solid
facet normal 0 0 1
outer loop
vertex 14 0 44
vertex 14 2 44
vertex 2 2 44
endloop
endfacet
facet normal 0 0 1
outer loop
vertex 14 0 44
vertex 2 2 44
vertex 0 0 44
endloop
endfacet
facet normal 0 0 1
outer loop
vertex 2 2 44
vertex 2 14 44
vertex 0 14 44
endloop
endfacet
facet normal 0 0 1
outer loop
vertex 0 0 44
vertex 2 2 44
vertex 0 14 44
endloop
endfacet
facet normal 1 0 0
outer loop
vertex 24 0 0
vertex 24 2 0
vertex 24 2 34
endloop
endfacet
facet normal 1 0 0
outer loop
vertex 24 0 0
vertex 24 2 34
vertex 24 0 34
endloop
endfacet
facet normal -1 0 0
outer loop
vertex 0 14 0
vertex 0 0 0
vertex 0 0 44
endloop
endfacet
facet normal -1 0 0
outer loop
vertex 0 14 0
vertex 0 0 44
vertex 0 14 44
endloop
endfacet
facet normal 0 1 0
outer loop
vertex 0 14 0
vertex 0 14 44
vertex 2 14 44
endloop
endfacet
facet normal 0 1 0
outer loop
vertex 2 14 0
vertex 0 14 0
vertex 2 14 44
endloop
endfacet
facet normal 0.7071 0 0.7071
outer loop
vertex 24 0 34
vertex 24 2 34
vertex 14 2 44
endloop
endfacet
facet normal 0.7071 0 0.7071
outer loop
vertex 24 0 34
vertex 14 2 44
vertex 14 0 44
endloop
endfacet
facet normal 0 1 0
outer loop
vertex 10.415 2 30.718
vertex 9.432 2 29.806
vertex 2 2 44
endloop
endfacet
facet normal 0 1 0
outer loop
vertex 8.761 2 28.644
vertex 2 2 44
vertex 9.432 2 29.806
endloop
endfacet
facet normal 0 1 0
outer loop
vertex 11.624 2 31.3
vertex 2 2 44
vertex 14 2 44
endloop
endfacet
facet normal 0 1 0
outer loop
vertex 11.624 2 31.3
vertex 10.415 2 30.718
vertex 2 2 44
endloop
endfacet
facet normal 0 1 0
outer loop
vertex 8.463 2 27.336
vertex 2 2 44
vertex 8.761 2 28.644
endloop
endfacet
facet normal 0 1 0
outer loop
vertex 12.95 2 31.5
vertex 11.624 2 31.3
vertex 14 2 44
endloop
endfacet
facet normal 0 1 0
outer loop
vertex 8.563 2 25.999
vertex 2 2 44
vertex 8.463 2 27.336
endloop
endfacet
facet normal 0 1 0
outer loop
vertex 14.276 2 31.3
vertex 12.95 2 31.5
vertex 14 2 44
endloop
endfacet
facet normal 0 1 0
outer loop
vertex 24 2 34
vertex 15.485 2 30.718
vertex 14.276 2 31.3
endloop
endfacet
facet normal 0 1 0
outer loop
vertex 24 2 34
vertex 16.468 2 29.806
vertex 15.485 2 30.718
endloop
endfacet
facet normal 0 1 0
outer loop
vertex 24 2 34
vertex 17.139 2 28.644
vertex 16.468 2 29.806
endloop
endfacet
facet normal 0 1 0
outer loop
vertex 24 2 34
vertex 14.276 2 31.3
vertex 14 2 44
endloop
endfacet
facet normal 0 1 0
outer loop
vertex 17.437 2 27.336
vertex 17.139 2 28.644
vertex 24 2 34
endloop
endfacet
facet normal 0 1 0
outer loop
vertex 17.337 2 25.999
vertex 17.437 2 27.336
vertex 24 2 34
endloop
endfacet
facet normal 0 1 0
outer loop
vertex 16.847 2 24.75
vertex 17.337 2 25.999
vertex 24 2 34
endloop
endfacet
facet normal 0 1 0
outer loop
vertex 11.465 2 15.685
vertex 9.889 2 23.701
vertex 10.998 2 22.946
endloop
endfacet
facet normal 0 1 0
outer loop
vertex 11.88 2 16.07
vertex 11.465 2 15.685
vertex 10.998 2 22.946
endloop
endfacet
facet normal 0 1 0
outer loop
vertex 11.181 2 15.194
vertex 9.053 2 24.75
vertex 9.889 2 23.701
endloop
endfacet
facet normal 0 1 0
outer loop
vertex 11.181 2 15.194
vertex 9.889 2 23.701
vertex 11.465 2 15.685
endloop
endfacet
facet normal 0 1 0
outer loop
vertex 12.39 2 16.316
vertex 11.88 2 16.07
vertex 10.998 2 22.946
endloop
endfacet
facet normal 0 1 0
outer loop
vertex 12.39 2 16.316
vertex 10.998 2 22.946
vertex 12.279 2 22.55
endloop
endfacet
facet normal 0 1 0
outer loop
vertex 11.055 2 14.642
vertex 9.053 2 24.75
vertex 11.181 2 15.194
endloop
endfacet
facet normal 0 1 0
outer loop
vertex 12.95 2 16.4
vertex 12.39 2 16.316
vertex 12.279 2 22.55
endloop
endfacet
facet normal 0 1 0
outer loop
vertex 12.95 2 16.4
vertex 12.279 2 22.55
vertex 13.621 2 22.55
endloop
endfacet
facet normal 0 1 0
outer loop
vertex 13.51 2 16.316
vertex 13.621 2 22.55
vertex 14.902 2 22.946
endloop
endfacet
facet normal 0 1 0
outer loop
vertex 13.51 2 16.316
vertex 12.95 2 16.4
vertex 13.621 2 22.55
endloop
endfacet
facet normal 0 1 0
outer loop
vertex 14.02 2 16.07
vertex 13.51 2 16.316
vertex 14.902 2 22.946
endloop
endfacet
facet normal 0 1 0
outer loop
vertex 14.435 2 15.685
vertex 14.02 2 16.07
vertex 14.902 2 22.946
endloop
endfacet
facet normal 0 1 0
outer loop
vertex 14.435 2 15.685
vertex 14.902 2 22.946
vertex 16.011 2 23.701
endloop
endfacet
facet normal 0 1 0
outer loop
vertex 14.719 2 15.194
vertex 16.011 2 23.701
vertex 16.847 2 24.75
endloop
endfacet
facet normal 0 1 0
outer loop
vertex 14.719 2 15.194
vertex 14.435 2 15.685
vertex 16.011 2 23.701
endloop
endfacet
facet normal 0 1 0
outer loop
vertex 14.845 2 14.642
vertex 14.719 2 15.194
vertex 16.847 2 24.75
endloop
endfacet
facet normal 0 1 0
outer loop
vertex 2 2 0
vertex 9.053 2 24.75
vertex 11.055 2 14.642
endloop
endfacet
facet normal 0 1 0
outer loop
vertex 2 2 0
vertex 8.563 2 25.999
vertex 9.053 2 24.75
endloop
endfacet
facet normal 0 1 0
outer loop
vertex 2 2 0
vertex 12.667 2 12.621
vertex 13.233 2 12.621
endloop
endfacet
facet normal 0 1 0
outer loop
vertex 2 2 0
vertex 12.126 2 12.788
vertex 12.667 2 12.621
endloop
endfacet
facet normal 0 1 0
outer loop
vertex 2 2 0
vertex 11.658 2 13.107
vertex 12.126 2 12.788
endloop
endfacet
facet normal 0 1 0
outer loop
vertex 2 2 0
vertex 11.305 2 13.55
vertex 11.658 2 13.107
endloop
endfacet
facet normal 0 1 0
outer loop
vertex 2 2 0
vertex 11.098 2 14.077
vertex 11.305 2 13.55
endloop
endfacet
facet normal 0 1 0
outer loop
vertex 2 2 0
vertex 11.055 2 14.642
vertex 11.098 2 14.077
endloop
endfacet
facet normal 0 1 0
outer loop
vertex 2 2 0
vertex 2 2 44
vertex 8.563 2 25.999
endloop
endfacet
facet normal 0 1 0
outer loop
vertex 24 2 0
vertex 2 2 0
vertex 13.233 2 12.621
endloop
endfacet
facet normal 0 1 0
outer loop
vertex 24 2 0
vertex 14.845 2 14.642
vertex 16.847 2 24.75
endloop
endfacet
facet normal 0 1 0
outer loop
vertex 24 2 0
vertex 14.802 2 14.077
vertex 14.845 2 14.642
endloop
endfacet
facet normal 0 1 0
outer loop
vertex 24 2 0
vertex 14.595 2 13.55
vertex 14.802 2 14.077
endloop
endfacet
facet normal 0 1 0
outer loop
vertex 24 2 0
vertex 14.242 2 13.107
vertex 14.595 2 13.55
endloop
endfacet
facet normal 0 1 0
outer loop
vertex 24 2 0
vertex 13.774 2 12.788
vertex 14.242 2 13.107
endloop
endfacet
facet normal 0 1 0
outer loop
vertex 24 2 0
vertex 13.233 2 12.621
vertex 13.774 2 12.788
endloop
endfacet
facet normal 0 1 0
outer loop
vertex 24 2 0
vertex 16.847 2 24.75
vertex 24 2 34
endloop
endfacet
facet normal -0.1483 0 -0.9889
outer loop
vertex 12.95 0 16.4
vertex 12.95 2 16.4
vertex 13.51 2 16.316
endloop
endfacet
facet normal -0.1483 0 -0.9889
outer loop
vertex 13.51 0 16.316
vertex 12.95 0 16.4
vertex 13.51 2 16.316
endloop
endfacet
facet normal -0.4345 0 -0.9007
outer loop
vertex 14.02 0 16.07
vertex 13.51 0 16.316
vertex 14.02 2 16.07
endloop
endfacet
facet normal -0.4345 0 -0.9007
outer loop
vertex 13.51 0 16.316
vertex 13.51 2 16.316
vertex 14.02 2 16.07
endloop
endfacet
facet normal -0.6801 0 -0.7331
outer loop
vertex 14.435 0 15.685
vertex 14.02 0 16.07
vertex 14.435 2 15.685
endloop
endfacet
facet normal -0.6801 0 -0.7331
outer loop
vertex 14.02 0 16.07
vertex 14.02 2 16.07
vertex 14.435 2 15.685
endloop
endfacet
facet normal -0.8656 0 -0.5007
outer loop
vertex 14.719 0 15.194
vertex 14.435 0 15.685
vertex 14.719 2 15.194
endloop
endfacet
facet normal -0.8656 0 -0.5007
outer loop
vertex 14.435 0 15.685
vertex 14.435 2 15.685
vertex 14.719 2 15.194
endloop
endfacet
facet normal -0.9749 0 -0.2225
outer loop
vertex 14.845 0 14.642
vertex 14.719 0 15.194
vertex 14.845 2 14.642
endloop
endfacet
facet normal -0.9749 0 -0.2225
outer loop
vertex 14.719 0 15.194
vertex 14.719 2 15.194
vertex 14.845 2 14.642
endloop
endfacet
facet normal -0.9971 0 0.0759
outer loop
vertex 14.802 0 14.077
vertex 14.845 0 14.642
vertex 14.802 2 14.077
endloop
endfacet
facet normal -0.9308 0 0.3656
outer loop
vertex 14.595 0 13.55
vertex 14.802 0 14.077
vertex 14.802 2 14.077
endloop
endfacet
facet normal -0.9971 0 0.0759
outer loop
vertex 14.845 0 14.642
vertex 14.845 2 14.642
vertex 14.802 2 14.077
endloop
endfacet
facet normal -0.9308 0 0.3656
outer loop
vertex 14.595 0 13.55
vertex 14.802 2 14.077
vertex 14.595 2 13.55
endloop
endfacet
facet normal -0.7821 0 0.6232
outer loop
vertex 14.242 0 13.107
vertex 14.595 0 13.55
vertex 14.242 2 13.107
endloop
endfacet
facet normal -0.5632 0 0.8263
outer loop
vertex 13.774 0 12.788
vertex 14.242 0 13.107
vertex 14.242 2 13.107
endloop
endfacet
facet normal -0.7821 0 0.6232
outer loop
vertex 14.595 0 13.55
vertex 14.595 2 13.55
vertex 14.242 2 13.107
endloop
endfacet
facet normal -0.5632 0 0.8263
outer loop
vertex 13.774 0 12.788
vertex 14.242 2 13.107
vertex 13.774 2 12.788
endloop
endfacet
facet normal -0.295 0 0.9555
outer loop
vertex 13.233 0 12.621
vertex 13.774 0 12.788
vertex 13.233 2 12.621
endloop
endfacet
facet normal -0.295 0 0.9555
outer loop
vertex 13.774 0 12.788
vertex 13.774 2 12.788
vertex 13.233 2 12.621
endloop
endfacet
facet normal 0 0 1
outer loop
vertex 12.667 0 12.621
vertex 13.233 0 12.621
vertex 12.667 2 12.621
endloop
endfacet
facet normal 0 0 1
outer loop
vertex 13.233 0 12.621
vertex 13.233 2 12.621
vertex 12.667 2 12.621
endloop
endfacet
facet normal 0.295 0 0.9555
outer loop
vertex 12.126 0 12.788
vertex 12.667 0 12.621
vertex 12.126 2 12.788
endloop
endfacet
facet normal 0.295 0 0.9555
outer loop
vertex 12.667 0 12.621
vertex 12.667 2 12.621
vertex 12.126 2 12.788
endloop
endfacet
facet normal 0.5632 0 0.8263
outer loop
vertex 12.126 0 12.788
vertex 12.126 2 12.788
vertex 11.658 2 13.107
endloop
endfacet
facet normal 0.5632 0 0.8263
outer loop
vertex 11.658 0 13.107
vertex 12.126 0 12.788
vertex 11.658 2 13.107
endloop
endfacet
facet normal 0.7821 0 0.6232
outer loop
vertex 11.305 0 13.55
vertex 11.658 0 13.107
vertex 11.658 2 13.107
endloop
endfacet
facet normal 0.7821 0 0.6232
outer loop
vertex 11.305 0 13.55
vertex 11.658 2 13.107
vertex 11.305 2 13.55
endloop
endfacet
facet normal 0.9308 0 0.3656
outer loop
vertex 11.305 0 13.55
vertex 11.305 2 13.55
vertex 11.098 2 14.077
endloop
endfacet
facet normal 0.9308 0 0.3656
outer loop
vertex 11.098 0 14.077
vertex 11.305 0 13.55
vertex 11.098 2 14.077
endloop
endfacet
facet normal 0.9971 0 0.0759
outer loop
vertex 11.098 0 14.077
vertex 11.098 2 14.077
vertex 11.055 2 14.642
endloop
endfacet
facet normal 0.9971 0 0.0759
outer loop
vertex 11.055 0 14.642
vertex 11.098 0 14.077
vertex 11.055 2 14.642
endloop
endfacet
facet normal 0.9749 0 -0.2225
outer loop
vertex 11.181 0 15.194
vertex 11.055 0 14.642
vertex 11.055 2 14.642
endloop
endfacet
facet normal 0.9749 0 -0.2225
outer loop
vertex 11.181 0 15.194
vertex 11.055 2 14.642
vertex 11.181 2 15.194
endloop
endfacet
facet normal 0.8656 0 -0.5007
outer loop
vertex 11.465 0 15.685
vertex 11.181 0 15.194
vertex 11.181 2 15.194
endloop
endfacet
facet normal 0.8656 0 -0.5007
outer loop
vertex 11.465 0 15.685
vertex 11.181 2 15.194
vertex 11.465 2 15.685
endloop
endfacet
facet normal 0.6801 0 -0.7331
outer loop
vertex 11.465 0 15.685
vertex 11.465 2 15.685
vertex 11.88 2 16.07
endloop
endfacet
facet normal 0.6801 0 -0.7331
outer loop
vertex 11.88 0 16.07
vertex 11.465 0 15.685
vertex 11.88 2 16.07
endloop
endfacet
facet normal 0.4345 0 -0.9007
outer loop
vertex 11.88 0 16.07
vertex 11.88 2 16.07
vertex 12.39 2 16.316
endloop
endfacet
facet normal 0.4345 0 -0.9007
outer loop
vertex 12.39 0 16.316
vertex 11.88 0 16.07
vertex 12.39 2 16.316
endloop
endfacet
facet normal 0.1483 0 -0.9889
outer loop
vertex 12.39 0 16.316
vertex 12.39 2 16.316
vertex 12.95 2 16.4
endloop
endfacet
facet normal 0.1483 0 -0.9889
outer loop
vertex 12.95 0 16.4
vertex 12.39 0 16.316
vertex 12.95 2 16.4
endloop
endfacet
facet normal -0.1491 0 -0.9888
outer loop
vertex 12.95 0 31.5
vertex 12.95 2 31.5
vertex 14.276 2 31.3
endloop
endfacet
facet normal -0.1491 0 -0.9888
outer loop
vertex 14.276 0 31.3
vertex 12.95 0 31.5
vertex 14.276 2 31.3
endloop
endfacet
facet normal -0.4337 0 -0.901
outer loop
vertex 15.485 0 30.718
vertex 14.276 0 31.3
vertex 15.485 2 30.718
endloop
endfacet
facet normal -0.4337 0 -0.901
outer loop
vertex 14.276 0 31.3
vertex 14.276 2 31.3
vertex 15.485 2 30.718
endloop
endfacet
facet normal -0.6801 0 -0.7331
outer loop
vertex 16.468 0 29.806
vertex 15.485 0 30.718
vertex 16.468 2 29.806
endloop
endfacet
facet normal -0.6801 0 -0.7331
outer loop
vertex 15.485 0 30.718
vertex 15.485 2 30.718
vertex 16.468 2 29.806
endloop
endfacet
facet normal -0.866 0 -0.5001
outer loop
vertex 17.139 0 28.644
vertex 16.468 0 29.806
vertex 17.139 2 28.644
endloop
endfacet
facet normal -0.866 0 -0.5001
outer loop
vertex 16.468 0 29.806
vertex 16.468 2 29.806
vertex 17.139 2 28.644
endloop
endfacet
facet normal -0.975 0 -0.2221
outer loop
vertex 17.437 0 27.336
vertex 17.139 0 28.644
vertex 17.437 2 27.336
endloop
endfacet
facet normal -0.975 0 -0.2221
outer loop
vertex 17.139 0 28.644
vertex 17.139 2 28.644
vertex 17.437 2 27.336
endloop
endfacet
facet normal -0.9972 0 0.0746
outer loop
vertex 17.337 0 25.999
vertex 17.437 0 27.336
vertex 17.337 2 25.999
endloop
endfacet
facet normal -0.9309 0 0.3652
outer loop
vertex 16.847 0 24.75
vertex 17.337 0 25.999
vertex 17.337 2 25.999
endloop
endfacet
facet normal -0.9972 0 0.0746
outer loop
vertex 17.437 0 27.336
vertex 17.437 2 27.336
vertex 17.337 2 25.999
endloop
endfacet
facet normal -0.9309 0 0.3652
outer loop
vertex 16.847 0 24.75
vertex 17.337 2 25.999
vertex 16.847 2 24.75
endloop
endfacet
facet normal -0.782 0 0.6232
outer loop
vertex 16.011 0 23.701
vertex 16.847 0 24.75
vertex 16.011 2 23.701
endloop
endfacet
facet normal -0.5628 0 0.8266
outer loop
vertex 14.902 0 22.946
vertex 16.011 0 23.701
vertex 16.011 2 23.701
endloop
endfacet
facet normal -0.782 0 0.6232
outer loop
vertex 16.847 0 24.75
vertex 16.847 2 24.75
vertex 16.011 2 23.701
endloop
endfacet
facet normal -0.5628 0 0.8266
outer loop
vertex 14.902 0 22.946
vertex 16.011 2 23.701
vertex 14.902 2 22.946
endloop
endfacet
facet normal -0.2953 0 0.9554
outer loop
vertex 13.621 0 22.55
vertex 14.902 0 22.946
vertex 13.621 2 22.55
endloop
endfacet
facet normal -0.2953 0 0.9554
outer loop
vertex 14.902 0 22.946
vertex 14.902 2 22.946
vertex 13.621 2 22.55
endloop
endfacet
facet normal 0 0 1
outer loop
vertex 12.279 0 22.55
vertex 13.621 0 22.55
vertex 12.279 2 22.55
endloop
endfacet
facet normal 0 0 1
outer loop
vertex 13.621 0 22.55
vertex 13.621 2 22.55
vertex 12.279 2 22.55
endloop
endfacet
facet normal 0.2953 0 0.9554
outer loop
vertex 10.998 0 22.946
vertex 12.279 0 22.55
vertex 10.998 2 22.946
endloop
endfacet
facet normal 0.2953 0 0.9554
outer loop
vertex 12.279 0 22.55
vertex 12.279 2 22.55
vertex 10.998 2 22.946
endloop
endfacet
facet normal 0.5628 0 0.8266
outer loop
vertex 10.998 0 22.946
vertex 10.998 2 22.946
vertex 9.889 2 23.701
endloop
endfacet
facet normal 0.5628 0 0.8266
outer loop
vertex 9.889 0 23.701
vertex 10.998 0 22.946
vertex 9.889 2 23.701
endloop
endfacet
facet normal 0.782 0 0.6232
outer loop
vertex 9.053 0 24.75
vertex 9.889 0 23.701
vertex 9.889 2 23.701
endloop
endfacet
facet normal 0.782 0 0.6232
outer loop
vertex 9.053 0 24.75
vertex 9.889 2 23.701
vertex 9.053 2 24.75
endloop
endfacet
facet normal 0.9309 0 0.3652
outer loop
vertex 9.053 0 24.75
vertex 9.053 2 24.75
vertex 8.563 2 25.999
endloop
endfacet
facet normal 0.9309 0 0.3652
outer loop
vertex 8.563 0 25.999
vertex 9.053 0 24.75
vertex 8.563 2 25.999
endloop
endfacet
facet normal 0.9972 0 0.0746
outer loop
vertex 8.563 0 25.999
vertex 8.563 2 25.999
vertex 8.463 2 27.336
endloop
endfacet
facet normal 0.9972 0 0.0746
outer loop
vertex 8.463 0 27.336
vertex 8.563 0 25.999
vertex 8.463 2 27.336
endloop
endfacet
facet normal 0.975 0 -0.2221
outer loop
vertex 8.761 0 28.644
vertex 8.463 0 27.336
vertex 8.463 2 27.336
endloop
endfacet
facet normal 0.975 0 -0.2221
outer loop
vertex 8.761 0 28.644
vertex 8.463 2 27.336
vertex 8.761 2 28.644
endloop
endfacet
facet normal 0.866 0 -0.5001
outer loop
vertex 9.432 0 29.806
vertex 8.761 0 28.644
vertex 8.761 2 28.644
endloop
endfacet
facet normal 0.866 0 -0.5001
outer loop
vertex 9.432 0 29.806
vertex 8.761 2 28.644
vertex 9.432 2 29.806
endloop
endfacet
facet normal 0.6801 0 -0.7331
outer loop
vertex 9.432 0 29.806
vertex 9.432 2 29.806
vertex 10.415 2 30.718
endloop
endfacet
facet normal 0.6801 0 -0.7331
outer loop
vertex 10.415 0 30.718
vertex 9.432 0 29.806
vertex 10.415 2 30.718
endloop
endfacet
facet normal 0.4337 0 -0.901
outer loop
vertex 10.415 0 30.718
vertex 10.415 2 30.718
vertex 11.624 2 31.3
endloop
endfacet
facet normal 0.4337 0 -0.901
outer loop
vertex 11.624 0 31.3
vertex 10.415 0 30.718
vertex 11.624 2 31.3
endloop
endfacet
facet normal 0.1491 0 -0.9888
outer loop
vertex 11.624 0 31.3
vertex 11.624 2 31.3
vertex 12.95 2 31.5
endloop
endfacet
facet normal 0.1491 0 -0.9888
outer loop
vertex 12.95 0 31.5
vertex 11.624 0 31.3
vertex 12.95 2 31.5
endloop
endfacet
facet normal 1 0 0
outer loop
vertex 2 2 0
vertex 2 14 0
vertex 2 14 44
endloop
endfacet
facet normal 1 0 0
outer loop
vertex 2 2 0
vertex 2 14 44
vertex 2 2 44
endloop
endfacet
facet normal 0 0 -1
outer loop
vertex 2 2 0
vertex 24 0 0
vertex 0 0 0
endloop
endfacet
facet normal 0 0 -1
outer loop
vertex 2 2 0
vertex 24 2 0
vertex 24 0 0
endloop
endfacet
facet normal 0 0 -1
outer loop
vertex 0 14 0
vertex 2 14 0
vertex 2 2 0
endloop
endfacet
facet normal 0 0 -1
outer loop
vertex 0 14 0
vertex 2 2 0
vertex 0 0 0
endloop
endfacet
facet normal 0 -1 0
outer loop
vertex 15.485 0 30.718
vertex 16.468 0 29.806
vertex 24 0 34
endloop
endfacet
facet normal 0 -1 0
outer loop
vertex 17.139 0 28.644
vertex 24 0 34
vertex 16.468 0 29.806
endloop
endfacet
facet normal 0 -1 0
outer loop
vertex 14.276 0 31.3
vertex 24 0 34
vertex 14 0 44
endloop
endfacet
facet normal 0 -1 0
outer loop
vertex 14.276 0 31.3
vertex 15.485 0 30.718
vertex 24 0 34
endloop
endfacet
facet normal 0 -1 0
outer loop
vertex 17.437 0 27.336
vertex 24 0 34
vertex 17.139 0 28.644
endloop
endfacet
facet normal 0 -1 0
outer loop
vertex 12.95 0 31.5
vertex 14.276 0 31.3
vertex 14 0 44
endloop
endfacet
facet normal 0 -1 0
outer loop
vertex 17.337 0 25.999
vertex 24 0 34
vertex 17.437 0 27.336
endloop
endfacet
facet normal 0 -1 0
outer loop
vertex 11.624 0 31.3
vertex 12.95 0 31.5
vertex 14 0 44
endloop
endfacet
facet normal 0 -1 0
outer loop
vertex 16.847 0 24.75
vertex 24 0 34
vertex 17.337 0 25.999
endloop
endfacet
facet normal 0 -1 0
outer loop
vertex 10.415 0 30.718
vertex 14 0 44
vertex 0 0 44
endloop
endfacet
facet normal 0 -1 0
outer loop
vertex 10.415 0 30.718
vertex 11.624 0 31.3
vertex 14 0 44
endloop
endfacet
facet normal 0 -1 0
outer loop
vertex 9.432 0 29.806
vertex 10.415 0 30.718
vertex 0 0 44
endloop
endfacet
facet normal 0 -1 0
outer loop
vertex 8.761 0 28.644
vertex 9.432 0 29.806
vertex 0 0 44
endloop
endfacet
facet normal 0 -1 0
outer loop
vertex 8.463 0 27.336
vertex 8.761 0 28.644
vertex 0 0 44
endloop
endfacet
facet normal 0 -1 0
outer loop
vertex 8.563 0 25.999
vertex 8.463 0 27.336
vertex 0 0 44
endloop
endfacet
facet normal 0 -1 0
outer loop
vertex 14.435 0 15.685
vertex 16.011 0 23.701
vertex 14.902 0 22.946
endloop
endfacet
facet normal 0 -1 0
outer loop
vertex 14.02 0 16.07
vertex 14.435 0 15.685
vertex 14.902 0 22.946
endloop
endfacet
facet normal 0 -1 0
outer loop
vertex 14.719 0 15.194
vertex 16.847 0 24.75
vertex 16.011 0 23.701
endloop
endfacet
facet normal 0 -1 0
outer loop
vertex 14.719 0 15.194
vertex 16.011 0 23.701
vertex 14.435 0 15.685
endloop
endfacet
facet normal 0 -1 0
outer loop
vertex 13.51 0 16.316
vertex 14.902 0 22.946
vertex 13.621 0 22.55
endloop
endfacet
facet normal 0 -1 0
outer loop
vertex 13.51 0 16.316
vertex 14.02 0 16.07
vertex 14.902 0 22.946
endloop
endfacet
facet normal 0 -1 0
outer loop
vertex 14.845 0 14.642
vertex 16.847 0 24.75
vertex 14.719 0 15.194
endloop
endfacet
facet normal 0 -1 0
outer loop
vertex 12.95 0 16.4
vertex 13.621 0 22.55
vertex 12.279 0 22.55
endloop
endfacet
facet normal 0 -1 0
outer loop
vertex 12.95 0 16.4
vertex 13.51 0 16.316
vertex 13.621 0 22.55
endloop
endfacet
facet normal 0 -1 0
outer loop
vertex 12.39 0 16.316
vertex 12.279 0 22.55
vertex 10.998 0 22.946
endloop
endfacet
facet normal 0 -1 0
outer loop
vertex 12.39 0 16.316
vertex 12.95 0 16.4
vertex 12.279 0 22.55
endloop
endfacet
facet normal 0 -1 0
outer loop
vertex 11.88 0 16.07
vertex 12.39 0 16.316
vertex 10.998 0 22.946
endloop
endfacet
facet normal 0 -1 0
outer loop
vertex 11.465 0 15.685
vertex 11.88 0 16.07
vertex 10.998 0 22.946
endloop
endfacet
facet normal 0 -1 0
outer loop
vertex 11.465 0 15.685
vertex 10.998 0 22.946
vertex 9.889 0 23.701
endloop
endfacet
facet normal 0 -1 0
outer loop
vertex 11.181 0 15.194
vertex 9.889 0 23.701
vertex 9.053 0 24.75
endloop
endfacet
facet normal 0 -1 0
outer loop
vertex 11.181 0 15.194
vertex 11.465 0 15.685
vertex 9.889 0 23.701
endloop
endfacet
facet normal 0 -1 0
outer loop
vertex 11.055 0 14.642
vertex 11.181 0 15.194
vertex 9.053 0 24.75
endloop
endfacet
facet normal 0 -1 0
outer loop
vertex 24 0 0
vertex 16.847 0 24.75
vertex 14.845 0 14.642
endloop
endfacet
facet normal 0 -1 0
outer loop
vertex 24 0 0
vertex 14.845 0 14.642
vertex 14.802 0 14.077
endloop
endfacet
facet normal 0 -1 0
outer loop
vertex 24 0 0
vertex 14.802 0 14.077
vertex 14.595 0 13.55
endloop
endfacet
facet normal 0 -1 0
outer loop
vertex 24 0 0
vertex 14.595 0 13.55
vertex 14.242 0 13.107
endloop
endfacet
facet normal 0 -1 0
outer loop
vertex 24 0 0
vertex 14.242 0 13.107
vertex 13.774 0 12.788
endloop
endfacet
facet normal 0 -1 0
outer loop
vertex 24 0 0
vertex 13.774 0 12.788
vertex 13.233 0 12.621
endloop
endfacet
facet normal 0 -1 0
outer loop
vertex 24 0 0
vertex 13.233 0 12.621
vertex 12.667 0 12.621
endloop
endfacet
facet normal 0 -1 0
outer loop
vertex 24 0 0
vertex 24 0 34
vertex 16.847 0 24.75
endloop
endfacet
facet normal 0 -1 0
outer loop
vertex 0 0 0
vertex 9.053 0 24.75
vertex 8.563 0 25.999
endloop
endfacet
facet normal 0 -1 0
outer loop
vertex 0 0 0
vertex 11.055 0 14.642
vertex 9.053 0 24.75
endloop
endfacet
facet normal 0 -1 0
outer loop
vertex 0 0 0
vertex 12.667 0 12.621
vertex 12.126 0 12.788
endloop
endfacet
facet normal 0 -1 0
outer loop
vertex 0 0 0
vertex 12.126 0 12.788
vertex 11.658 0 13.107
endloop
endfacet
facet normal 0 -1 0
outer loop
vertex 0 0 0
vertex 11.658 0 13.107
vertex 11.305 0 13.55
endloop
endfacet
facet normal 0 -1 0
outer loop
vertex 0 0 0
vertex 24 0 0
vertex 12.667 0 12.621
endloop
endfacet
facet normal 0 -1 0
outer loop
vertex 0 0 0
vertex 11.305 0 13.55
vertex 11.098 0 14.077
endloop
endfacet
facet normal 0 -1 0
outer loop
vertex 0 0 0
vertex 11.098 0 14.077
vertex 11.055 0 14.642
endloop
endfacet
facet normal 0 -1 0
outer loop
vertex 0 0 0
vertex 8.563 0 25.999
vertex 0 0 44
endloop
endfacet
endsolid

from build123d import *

# Parameters (mm, degrees)
EXTRUDE_1_DEPTH     = 44
SKETCH_4_R          = 1.9
SKETCH_4_R_2        = 4.5
CUT_EXTRUDE_1_DEPTH = 52.536394907
CHAMFER_1_SIZE      = 10


with BuildPart() as part:
    # Эскиз2 → Вытянуть-Тонкостенный1 (new body)
    with BuildSketch(Plane.XY):
        Polygon((24, 0), (0, 0), (0, 14), (2, 14), (2, 2), (24, 2), align=None)
    extrude(amount=EXTRUDE_1_DEPTH)

    # Эскиз4 → Вырез-Вытянуть1 (cut, through all)
    with BuildSketch(Plane(origin=(0, 2, 0), x_dir=(-1, 0, 0), z_dir=(0, 1, 0))):
        with Locations(Location((-12.95, 14.5, 0), (0, 0, 90))):
            Circle(SKETCH_4_R)
        with Locations(Location((-12.95, 27, 0), (0, 0, 90))):
            Circle(SKETCH_4_R_2)
    extrude(amount=-CUT_EXTRUDE_1_DEPTH, mode=Mode.SUBTRACT)

    # Фаска1
    chamfer_1_edges = [part.edges().sort_by_distance(p)[0] for p in [
        (24, 1, 44),
    ]]
    chamfer(chamfer_1_edges, length=CHAMFER_1_SIZE)


solid = part.part
